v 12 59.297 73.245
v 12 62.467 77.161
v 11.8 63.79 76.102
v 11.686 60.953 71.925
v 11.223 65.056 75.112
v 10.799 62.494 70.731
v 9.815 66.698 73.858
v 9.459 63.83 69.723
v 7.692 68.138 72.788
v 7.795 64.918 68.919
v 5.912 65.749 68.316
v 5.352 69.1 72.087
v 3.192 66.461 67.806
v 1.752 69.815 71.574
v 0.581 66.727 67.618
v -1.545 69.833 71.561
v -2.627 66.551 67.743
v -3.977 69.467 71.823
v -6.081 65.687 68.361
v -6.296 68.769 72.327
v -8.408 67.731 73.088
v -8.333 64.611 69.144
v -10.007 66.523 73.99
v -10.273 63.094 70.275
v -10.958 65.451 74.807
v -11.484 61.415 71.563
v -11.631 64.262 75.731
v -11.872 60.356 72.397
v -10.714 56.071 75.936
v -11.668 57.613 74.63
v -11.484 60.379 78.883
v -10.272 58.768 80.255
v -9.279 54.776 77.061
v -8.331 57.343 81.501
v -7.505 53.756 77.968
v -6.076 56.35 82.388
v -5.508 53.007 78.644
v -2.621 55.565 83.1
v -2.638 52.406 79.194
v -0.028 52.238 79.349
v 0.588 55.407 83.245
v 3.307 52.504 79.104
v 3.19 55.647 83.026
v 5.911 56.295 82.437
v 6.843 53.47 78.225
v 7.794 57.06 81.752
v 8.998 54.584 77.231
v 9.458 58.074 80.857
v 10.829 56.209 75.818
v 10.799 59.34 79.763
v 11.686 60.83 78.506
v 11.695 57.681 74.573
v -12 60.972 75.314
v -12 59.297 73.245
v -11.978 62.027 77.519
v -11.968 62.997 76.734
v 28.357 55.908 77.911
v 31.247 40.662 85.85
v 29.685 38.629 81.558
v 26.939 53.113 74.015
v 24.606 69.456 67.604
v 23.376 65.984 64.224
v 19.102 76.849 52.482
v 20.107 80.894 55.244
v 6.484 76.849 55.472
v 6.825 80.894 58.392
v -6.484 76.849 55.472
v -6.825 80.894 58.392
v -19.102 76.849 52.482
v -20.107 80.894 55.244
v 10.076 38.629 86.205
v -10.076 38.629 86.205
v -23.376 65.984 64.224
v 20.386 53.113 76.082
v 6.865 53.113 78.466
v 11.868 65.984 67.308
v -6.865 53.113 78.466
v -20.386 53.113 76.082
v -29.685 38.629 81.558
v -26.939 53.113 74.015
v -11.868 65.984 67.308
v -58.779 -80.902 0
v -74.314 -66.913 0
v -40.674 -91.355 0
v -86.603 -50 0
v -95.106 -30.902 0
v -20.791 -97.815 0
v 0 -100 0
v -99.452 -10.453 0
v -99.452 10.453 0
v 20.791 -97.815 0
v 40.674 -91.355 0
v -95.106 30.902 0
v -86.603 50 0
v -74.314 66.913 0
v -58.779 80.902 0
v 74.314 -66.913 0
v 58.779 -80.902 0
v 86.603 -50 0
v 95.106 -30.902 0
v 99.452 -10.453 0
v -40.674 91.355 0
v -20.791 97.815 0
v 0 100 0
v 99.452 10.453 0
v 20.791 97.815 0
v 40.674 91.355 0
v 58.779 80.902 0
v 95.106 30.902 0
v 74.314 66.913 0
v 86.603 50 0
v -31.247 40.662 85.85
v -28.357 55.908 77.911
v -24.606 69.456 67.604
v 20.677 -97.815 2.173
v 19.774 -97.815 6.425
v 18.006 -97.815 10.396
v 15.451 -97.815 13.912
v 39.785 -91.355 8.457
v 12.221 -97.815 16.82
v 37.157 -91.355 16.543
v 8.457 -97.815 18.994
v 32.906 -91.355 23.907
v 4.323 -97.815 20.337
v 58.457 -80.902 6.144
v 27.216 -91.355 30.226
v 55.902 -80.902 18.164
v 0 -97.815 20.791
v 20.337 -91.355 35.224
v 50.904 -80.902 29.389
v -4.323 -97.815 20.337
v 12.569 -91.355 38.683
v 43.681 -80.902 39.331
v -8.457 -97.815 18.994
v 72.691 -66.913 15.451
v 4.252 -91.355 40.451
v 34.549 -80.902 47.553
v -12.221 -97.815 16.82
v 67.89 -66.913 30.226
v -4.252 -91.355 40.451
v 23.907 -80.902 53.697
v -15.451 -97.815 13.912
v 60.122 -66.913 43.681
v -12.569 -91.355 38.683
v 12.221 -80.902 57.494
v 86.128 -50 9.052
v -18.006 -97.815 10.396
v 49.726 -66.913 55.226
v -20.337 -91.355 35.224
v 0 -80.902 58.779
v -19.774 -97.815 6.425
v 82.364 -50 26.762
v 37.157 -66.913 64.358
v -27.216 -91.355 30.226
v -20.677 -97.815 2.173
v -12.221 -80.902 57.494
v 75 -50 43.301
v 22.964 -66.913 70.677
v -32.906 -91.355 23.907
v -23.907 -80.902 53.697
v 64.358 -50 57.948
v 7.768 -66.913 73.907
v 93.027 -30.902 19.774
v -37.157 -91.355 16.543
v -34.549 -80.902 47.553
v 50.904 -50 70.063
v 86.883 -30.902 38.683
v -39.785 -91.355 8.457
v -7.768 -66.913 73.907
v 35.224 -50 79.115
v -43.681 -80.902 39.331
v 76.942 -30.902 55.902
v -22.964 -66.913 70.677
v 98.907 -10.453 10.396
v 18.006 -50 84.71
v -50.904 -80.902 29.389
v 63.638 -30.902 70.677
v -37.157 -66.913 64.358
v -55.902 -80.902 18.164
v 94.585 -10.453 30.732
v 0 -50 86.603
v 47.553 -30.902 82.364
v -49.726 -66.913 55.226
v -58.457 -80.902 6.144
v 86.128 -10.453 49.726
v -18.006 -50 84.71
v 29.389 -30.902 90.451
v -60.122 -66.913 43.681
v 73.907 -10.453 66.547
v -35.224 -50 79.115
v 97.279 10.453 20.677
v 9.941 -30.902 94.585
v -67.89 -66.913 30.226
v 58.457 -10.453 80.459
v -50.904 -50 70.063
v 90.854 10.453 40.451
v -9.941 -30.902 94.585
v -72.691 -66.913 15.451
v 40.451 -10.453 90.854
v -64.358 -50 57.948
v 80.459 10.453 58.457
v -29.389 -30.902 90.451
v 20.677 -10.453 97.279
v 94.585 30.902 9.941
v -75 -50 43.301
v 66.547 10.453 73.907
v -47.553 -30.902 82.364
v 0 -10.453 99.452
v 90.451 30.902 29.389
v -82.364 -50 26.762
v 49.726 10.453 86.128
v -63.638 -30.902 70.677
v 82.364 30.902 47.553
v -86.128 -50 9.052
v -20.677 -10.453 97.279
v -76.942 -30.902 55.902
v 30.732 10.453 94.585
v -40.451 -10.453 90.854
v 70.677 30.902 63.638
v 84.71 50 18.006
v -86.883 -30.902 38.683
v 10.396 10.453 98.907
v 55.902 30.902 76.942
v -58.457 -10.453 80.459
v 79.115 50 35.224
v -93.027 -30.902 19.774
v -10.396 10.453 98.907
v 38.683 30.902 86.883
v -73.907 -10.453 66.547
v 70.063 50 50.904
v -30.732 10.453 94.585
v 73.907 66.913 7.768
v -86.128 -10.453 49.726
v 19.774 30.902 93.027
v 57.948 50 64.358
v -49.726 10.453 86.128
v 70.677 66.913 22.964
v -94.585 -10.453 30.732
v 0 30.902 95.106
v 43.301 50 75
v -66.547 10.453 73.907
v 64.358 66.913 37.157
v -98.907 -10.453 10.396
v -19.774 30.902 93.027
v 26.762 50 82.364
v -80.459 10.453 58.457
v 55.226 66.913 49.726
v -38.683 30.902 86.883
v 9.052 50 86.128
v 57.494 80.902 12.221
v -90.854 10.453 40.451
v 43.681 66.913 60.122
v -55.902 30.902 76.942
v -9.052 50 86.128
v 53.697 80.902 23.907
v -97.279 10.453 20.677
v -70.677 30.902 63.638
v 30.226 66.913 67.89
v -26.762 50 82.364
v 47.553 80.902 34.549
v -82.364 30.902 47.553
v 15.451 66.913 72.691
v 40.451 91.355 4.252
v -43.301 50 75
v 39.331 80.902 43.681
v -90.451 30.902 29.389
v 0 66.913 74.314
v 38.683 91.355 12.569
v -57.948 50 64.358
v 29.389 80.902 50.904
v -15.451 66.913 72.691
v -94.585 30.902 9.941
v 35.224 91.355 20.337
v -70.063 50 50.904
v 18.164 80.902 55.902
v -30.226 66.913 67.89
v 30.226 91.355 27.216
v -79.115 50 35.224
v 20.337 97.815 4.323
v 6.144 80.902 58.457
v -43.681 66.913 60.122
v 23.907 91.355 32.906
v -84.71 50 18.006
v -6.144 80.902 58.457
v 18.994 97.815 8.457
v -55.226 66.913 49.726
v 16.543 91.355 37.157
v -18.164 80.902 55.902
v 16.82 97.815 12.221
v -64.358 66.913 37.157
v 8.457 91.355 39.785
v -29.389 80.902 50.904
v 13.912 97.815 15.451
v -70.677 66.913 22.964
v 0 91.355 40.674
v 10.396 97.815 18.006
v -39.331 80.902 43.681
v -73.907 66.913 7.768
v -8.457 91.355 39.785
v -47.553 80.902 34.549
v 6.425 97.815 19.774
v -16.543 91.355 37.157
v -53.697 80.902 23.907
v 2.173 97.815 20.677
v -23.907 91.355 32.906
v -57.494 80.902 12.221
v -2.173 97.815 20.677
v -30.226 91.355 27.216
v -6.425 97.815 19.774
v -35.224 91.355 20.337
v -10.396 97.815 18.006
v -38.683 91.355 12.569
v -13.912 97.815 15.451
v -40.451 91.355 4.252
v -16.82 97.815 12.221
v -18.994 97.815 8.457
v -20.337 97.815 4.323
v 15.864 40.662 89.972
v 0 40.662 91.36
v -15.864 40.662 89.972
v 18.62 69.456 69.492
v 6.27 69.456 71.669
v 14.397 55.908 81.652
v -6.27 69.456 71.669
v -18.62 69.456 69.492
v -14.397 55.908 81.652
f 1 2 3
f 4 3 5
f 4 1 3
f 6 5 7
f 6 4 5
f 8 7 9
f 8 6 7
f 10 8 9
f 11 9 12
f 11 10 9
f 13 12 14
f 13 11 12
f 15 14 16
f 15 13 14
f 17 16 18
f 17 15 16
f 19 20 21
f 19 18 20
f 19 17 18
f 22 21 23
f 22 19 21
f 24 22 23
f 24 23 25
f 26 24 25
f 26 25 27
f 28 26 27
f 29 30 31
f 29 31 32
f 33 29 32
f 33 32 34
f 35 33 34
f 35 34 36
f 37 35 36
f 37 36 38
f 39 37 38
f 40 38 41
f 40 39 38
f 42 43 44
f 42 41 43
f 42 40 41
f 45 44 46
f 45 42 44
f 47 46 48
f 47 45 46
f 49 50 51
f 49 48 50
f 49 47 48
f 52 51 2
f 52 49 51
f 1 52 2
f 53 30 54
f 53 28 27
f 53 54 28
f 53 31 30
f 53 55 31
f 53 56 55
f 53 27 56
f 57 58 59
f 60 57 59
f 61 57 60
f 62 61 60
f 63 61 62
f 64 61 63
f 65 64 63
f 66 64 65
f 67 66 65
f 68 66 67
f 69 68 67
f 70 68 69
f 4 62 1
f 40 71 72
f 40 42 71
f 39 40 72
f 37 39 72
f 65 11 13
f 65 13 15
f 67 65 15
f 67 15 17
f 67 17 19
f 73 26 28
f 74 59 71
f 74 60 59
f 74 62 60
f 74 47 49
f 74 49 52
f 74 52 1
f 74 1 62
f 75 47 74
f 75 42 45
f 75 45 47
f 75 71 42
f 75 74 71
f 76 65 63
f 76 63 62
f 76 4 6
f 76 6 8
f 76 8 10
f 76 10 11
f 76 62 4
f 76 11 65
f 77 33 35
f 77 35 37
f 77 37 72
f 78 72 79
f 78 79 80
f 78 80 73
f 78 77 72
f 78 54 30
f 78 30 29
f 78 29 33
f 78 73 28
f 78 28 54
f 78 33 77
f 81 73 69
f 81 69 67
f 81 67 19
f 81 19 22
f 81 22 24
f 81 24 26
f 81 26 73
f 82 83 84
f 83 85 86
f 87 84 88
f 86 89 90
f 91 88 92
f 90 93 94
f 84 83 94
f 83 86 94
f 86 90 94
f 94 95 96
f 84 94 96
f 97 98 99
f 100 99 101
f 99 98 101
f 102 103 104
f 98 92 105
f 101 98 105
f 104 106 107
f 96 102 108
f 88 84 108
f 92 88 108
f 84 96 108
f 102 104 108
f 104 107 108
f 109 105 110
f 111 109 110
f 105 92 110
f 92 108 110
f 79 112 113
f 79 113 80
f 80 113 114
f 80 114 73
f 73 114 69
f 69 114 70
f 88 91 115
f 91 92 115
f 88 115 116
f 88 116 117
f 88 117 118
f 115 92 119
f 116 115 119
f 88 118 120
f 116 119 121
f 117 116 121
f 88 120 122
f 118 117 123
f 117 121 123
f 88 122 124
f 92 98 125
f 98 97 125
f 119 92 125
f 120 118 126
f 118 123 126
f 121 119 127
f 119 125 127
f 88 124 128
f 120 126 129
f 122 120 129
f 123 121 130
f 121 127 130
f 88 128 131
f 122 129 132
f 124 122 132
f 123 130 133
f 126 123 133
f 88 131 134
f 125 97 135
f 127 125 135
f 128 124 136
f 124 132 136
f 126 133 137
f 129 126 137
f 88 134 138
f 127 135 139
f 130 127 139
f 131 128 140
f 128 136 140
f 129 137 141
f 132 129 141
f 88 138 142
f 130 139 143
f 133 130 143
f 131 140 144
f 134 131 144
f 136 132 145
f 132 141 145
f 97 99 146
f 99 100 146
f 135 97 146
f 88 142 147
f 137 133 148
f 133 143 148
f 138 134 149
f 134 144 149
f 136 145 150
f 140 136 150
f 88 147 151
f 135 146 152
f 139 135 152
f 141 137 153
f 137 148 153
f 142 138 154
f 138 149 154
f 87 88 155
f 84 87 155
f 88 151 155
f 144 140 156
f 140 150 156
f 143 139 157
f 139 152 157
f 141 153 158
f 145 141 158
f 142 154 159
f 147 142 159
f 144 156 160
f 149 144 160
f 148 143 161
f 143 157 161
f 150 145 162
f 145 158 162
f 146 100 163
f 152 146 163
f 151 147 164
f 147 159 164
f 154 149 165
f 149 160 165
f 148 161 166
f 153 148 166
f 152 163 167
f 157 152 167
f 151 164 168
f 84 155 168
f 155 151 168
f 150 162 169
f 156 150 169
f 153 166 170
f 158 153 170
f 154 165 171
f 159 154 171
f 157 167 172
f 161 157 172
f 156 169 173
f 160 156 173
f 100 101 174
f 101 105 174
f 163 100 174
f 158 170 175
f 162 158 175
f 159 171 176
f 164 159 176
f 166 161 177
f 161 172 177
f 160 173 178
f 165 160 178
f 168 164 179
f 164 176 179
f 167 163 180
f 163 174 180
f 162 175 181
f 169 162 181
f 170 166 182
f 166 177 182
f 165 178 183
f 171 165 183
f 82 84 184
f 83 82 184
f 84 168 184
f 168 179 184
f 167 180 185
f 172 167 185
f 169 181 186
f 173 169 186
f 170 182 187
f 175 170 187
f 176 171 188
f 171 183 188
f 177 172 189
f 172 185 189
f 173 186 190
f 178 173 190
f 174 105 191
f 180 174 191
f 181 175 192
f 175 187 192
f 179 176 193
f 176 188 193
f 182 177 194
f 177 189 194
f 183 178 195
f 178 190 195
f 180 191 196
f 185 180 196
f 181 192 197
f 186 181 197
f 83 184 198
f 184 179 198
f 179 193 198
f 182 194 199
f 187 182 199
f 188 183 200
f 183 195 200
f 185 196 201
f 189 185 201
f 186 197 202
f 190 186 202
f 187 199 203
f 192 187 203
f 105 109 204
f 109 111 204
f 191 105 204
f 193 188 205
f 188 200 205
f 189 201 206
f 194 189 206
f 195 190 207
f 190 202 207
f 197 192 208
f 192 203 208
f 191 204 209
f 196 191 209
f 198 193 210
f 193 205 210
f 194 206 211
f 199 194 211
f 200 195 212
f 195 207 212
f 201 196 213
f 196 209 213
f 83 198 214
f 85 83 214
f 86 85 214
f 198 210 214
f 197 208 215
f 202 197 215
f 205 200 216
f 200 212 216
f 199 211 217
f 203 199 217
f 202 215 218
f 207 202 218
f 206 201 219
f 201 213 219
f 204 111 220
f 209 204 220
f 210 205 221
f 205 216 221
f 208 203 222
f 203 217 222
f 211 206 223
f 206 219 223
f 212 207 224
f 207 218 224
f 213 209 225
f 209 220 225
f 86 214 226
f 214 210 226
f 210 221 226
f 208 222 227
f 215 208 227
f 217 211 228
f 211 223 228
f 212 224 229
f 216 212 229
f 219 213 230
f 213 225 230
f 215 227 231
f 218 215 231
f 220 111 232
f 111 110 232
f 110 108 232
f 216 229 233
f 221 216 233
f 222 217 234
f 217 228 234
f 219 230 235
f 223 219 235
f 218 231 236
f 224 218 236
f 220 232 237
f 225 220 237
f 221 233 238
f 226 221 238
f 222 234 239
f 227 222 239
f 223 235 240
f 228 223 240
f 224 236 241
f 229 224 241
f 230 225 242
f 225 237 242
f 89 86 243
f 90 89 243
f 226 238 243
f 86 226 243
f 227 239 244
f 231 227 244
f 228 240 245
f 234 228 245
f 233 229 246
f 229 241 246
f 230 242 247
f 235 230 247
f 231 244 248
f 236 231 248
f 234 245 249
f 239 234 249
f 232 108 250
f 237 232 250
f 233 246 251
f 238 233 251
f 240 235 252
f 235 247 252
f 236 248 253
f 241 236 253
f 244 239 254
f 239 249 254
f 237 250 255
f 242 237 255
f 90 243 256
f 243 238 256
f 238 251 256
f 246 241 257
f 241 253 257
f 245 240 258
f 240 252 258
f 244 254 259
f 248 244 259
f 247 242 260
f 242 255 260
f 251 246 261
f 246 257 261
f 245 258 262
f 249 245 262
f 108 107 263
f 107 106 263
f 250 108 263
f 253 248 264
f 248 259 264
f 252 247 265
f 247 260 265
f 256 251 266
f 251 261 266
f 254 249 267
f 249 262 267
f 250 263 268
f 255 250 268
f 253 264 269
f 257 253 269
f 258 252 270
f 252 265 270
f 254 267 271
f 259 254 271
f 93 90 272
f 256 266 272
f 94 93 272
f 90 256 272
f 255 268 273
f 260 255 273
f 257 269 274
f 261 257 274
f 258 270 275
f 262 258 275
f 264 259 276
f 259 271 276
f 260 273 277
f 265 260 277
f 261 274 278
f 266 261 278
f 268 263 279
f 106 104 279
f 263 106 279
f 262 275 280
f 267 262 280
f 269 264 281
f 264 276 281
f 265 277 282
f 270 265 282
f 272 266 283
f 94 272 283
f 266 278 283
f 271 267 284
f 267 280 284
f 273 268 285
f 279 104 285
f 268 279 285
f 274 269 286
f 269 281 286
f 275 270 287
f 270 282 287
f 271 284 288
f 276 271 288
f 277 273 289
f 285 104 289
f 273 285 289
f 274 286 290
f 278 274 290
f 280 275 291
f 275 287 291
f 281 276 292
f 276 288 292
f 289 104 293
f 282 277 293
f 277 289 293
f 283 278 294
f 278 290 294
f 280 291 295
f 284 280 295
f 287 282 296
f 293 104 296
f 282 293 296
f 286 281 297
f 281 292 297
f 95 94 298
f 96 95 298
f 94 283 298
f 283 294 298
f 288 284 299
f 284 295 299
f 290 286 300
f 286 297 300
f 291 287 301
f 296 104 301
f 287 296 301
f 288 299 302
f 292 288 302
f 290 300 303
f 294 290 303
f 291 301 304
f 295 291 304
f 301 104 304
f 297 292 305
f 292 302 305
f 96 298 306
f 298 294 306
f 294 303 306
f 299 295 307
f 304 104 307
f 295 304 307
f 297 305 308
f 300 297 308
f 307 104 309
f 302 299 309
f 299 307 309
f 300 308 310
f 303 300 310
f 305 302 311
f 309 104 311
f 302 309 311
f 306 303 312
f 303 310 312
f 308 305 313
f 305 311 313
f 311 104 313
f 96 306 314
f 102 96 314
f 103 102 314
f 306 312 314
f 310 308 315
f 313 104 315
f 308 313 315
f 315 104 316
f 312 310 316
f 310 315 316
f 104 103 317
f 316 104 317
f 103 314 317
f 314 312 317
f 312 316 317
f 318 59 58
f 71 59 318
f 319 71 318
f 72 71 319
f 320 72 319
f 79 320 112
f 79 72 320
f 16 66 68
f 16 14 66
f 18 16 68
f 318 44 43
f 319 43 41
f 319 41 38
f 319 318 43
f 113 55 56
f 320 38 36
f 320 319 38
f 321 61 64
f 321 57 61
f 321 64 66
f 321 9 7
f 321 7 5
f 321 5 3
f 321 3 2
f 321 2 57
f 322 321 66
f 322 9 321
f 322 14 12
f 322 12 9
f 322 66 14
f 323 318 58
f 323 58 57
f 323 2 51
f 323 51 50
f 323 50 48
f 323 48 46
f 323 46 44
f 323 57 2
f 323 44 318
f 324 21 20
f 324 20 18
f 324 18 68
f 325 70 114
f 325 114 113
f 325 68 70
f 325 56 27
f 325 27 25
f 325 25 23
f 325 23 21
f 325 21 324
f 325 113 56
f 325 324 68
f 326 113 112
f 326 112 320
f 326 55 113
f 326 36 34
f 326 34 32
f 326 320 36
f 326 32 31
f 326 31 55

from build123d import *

# Parameters (mm, degrees)
REVOLVE_2_ANGLE           = 180
REVOLVE_3_ANGLE           = 20
REVOLVE_3_OTHER_WAY_ANGLE = 20
SWEEP_START               = 94.23905762
SWEEP_1_DEPTH             = 5.76094238


# Read off the part's stored shape, not the designer's step: Вырез-По траектории1
with BuildPart() as part:
    # Эскиз1 → Повернуть2 (revolve)
    with BuildSketch(Plane.XY):
        with BuildLine():
            Line((0, 100), (0, -100))
            ThreePointArc((0, -100), (100, 0), (0, 100))
        make_face()
    revolve(axis=Axis((0, 100, 0), (0, -1, 0)), revolution_arc=REVOLVE_2_ANGLE)


with BuildPart() as body_2:
    # Эскиз2 → Повернуть3 (revolve)
    with BuildSketch(Plane(origin=(0, 0, 0), x_dir=(0, 0, -1), z_dir=(1, 0, 0))):
        with BuildLine():
            Line((-91.359922709, 40.661585344), (-86.791926573, 38.628506077))
            ThreePointArc((-86.791926573, 38.628506077), (-73.836770334, 59.775675209), (-55.849760218, 76.849230859))
            Line((-55.849760218, 76.849230859), (-58.789221282, 80.89392722))
            ThreePointArc((-58.789221282, 80.89392722), (-77.722916141, 62.921763377), (-91.359922709, 40.661585344))
        make_face()
    revolve(axis=Axis((0, 0, 0), (0, 1, 0)), revolution_arc=REVOLVE_3_ANGLE)

    # Эскиз2 → Повернуть3 other way (revolve)
    with BuildSketch(Plane(origin=(0, 0, 0), x_dir=(0, 0, -1), z_dir=(1, 0, 0))):
        with BuildLine():
            Line((-91.359922709, 40.661585344), (-86.791926573, 38.628506077))
            ThreePointArc((-86.791926573, 38.628506077), (-73.836770334, 59.775675209), (-55.849760218, 76.849230859))
            Line((-55.849760218, 76.849230859), (-58.789221282, 80.89392722))
            ThreePointArc((-58.789221282, 80.89392722), (-77.722916141, 62.921763377), (-91.359922709, 40.661585344))
        make_face()
    revolve(axis=Axis((0, 0, 0), (0, -1, 0)), revolution_arc=REVOLVE_3_OTHER_WAY_ANGLE)

    # Вырез-По траектории1 outline → Вырез-По траектории1 (cut)
    with BuildSketch(Plane(origin=(0, 0, 0), x_dir=(1, 0, 0), z_dir=(0, 0.6292176337744182, 0.7772291614107913)).offset(SWEEP_START)):
        with BuildLine():
            add(Edge.make_bspline(
                [(12, 0), (12, 18.653499874), (-12, 18.653499874), (-12, 0), (-12, -18.653499874), (12, -18.653499874), (12, 0)],
                knots=[0, 0, 0, 0, 0.5, 0.5, 0.5, 1, 1, 1, 1], degree=3, weights=[1, 0.333333333, 0.333333333, 1, 0.333333333, 0.333333333, 1]))
        make_face()
    extrude(amount=SWEEP_1_DEPTH, mode=Mode.SUBTRACT)


solid = Compound([part.part, body_2.part])
